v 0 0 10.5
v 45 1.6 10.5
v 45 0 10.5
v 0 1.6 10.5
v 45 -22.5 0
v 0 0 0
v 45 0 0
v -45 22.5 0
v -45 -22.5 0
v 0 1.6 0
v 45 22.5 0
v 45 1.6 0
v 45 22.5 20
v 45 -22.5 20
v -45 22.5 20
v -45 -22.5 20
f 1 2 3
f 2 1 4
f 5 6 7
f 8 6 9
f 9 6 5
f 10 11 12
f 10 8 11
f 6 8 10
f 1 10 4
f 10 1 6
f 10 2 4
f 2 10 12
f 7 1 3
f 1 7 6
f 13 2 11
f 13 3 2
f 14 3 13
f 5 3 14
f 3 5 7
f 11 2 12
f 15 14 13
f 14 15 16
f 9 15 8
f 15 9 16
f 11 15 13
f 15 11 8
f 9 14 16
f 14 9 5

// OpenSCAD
// Slide drying rack - holds 10 microscope slides standing upright on their long edge
// Print orientation: base block on the bed (z = 0), slots open at the top

// ---------- Block ----------
block_l = 90;    // block length along X (mm)
block_w = 45;    // block width along Y (mm)
block_h = 20;    // block height along Z (mm)

// ---------- Slots ----------
slot_n     = 10;    // number of slide slots
slot_len   = 77;    // slot length along X (mm)
slot_w     = 1.6;   // slot width along Y (mm)
slot_depth = 10;    // slot depth into the block (mm)
slot_pitch = 3.5;   // centre-to-centre spacing along Y (mm)

// ---------- Misc ----------
eps = 0.5;       // overshoot so cutters pass cleanly through the top face (mm)
$fn = 64;

// Derived: first slot centre Y, then all slot centres
slot_y0 = -(slot_n - 1) * slot_pitch / 2;
slot_c  = [for (i = [0 : slot_n - 1]) [i * slot_pitch]];

difference() {
    // Solid base block, centred in X and Y, sitting on z = 0
    translate([-block_l / 2, -block_w / 2, 0])
        cube([block_l, block_w, block_h]);

    // Parallel slots running along X, open at the top
    for (j = [0 : slot_n - 1])
        translate([-slot_len / 2, slot_y0 + slot_c[j] - slot_pitch / 2, block_h - slot_depth])
            cube([slot_len, slot_w, slot_depth + eps]);
}
